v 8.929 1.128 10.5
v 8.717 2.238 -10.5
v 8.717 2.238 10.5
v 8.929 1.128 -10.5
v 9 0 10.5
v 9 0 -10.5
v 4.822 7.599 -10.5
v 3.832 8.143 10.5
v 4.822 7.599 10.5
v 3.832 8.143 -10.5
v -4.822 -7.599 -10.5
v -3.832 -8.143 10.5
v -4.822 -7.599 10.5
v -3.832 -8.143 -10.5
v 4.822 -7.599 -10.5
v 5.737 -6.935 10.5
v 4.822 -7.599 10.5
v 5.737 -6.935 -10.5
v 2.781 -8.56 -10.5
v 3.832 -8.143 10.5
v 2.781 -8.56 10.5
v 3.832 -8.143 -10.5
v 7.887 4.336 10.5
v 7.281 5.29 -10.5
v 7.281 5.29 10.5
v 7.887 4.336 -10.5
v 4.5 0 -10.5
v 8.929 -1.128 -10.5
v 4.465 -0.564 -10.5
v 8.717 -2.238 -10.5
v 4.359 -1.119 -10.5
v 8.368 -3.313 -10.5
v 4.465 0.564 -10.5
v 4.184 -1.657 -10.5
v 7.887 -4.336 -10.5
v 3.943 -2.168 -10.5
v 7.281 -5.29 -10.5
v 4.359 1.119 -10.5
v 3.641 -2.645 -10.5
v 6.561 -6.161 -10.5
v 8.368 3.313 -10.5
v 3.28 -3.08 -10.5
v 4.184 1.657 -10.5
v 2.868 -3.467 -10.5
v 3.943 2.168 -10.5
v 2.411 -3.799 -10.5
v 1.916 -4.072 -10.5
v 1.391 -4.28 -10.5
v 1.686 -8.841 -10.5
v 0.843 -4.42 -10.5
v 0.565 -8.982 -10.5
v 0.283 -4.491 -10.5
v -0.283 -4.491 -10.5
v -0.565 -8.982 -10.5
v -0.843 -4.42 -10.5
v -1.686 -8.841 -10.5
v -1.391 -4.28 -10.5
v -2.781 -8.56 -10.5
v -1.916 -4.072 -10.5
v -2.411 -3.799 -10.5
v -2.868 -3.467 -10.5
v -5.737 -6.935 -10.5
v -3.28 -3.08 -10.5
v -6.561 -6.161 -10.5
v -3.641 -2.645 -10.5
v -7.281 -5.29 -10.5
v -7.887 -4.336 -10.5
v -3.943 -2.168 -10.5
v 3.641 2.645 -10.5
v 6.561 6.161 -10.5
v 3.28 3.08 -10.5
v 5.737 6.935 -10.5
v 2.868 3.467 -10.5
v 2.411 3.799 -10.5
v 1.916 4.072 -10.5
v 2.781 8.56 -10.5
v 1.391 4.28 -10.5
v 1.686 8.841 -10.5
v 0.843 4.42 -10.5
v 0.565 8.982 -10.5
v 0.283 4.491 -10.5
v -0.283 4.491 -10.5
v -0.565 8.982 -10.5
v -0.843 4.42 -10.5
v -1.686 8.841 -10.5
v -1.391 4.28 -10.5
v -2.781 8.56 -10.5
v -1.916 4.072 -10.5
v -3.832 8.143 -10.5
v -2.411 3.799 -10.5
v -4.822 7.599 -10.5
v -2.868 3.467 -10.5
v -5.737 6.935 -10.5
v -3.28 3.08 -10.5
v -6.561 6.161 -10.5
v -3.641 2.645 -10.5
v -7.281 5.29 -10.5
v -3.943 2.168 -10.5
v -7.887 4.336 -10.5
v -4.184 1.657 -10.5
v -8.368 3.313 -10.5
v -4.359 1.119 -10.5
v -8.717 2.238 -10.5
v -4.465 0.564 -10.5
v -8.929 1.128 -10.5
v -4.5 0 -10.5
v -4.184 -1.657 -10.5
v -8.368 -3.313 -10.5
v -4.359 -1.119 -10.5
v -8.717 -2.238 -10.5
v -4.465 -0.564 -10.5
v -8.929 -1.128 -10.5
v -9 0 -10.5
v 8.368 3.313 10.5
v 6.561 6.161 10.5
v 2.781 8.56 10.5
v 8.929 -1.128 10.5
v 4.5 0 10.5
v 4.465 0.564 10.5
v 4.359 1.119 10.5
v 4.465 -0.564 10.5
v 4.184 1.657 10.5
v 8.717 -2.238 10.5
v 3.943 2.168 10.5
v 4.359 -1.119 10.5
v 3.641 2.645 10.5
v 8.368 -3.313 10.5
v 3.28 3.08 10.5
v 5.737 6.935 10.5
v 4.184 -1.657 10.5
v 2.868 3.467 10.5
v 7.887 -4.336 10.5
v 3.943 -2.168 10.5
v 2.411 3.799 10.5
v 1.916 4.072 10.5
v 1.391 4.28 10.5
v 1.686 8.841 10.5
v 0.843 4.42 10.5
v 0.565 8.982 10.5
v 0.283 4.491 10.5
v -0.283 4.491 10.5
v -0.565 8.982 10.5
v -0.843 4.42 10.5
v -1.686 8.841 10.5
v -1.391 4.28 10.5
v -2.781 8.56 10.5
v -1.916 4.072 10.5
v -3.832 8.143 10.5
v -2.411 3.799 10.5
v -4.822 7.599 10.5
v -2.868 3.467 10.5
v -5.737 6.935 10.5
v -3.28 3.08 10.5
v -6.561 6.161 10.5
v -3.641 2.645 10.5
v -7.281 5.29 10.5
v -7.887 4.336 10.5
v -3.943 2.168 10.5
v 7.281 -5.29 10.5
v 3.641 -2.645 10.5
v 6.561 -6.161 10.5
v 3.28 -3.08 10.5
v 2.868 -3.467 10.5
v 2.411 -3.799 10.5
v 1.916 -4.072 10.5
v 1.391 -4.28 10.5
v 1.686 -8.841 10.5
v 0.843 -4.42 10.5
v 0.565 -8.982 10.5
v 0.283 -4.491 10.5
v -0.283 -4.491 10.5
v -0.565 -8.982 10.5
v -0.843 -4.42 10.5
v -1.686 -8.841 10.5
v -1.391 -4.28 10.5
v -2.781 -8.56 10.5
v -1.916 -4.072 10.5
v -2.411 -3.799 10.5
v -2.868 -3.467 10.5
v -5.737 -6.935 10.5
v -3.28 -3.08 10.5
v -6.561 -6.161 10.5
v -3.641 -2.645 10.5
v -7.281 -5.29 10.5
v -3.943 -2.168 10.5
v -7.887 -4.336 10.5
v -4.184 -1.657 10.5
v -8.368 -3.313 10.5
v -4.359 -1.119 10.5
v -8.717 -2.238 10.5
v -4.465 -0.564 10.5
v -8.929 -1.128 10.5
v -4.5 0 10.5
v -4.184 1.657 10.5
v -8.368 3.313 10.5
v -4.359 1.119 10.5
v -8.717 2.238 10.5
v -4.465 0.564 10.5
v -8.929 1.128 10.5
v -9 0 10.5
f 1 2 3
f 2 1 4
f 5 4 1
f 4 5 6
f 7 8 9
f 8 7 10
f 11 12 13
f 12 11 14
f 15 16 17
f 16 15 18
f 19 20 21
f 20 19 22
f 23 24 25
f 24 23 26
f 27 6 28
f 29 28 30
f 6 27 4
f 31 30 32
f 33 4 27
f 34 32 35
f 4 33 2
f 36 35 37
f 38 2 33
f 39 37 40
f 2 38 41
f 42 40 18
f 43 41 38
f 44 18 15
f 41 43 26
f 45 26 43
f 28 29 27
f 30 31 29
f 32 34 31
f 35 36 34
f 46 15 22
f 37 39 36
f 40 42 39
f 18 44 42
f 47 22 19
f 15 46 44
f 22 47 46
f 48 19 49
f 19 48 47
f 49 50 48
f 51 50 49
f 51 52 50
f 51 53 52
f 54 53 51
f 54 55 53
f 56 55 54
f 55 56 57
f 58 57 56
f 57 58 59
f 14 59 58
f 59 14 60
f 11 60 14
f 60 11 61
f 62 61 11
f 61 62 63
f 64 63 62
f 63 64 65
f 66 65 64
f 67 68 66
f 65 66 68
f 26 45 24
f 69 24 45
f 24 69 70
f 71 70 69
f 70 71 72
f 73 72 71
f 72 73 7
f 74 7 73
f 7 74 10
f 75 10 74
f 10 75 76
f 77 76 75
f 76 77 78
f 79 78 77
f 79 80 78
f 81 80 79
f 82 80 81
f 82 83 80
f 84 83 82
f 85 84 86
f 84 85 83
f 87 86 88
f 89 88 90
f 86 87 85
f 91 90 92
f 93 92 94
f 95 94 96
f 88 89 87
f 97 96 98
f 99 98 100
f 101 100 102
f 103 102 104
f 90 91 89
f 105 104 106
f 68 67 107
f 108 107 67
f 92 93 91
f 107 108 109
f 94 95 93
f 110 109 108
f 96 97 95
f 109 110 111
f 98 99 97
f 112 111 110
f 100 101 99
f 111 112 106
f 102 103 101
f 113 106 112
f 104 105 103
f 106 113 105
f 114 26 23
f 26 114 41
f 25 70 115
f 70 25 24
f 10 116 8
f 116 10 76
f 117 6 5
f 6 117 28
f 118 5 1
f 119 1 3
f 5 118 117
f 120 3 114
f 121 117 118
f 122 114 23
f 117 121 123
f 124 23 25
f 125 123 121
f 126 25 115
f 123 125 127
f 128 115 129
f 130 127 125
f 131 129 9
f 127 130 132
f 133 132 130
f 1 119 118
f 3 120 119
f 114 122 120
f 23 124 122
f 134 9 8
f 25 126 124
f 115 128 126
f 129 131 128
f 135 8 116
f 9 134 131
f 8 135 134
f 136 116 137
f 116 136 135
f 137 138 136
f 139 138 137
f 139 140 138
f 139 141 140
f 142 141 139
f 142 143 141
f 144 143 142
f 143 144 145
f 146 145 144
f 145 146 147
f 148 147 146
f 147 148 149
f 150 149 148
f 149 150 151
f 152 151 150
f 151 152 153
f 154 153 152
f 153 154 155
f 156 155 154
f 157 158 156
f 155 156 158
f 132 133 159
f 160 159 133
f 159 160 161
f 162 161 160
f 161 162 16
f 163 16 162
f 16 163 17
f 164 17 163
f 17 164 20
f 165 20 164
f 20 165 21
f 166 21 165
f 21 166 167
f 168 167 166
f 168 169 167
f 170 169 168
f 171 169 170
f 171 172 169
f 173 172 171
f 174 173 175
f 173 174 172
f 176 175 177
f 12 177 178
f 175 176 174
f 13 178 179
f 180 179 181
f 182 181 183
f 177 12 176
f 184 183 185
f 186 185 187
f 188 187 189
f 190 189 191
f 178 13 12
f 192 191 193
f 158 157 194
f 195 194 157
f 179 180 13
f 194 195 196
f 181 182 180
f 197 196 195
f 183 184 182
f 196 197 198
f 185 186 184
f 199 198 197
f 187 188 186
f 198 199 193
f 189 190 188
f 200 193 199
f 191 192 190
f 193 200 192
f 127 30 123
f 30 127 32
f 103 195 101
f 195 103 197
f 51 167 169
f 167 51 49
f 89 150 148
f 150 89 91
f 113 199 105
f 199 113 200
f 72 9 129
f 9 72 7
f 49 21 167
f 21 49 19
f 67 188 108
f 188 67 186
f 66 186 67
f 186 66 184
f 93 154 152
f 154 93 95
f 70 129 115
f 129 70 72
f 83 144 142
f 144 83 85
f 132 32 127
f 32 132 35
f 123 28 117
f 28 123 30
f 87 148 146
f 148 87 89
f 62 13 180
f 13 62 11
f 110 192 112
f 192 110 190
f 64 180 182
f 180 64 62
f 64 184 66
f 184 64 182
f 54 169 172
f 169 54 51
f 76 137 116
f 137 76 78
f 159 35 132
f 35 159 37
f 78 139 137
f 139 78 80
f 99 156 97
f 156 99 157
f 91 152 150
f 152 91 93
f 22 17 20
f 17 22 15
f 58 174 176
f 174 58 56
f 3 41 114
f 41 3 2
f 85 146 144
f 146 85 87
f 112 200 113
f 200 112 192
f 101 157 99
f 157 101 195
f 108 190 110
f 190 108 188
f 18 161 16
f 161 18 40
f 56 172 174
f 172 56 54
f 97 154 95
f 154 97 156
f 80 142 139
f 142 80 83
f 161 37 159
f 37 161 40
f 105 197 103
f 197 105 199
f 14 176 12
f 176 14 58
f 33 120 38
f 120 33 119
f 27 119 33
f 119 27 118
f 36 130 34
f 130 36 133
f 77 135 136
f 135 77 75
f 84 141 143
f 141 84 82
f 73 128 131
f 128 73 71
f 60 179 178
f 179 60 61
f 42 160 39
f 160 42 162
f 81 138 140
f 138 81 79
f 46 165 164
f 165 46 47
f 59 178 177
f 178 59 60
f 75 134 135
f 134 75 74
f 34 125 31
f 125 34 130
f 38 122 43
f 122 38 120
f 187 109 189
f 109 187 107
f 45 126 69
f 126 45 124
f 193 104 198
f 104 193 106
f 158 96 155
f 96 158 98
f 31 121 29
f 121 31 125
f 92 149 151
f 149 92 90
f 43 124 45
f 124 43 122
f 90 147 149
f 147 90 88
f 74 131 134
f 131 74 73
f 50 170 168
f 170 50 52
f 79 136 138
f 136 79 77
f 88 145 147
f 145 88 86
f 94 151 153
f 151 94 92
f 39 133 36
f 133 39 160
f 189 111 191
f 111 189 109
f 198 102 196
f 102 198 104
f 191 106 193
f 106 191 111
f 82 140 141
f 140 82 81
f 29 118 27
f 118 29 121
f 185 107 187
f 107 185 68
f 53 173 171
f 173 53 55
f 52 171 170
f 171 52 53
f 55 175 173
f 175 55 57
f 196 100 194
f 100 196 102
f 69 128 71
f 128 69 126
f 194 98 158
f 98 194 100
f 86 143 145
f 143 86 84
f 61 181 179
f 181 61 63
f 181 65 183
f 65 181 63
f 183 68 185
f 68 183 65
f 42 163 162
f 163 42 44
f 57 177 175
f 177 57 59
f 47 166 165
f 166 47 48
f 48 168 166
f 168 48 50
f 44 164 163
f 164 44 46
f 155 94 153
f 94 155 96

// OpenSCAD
$fn = 50;


difference() {
	union() {
		translate(v = [0, 0, -10.5000000000]) {
			cylinder(h = 21, r = 9.0000000000);
		}
	}
	union() {
		translate(v = [0, 0, -100.0000000000]) {
			cylinder(h = 200, r = 4.5000000000);
		}
	}
}
